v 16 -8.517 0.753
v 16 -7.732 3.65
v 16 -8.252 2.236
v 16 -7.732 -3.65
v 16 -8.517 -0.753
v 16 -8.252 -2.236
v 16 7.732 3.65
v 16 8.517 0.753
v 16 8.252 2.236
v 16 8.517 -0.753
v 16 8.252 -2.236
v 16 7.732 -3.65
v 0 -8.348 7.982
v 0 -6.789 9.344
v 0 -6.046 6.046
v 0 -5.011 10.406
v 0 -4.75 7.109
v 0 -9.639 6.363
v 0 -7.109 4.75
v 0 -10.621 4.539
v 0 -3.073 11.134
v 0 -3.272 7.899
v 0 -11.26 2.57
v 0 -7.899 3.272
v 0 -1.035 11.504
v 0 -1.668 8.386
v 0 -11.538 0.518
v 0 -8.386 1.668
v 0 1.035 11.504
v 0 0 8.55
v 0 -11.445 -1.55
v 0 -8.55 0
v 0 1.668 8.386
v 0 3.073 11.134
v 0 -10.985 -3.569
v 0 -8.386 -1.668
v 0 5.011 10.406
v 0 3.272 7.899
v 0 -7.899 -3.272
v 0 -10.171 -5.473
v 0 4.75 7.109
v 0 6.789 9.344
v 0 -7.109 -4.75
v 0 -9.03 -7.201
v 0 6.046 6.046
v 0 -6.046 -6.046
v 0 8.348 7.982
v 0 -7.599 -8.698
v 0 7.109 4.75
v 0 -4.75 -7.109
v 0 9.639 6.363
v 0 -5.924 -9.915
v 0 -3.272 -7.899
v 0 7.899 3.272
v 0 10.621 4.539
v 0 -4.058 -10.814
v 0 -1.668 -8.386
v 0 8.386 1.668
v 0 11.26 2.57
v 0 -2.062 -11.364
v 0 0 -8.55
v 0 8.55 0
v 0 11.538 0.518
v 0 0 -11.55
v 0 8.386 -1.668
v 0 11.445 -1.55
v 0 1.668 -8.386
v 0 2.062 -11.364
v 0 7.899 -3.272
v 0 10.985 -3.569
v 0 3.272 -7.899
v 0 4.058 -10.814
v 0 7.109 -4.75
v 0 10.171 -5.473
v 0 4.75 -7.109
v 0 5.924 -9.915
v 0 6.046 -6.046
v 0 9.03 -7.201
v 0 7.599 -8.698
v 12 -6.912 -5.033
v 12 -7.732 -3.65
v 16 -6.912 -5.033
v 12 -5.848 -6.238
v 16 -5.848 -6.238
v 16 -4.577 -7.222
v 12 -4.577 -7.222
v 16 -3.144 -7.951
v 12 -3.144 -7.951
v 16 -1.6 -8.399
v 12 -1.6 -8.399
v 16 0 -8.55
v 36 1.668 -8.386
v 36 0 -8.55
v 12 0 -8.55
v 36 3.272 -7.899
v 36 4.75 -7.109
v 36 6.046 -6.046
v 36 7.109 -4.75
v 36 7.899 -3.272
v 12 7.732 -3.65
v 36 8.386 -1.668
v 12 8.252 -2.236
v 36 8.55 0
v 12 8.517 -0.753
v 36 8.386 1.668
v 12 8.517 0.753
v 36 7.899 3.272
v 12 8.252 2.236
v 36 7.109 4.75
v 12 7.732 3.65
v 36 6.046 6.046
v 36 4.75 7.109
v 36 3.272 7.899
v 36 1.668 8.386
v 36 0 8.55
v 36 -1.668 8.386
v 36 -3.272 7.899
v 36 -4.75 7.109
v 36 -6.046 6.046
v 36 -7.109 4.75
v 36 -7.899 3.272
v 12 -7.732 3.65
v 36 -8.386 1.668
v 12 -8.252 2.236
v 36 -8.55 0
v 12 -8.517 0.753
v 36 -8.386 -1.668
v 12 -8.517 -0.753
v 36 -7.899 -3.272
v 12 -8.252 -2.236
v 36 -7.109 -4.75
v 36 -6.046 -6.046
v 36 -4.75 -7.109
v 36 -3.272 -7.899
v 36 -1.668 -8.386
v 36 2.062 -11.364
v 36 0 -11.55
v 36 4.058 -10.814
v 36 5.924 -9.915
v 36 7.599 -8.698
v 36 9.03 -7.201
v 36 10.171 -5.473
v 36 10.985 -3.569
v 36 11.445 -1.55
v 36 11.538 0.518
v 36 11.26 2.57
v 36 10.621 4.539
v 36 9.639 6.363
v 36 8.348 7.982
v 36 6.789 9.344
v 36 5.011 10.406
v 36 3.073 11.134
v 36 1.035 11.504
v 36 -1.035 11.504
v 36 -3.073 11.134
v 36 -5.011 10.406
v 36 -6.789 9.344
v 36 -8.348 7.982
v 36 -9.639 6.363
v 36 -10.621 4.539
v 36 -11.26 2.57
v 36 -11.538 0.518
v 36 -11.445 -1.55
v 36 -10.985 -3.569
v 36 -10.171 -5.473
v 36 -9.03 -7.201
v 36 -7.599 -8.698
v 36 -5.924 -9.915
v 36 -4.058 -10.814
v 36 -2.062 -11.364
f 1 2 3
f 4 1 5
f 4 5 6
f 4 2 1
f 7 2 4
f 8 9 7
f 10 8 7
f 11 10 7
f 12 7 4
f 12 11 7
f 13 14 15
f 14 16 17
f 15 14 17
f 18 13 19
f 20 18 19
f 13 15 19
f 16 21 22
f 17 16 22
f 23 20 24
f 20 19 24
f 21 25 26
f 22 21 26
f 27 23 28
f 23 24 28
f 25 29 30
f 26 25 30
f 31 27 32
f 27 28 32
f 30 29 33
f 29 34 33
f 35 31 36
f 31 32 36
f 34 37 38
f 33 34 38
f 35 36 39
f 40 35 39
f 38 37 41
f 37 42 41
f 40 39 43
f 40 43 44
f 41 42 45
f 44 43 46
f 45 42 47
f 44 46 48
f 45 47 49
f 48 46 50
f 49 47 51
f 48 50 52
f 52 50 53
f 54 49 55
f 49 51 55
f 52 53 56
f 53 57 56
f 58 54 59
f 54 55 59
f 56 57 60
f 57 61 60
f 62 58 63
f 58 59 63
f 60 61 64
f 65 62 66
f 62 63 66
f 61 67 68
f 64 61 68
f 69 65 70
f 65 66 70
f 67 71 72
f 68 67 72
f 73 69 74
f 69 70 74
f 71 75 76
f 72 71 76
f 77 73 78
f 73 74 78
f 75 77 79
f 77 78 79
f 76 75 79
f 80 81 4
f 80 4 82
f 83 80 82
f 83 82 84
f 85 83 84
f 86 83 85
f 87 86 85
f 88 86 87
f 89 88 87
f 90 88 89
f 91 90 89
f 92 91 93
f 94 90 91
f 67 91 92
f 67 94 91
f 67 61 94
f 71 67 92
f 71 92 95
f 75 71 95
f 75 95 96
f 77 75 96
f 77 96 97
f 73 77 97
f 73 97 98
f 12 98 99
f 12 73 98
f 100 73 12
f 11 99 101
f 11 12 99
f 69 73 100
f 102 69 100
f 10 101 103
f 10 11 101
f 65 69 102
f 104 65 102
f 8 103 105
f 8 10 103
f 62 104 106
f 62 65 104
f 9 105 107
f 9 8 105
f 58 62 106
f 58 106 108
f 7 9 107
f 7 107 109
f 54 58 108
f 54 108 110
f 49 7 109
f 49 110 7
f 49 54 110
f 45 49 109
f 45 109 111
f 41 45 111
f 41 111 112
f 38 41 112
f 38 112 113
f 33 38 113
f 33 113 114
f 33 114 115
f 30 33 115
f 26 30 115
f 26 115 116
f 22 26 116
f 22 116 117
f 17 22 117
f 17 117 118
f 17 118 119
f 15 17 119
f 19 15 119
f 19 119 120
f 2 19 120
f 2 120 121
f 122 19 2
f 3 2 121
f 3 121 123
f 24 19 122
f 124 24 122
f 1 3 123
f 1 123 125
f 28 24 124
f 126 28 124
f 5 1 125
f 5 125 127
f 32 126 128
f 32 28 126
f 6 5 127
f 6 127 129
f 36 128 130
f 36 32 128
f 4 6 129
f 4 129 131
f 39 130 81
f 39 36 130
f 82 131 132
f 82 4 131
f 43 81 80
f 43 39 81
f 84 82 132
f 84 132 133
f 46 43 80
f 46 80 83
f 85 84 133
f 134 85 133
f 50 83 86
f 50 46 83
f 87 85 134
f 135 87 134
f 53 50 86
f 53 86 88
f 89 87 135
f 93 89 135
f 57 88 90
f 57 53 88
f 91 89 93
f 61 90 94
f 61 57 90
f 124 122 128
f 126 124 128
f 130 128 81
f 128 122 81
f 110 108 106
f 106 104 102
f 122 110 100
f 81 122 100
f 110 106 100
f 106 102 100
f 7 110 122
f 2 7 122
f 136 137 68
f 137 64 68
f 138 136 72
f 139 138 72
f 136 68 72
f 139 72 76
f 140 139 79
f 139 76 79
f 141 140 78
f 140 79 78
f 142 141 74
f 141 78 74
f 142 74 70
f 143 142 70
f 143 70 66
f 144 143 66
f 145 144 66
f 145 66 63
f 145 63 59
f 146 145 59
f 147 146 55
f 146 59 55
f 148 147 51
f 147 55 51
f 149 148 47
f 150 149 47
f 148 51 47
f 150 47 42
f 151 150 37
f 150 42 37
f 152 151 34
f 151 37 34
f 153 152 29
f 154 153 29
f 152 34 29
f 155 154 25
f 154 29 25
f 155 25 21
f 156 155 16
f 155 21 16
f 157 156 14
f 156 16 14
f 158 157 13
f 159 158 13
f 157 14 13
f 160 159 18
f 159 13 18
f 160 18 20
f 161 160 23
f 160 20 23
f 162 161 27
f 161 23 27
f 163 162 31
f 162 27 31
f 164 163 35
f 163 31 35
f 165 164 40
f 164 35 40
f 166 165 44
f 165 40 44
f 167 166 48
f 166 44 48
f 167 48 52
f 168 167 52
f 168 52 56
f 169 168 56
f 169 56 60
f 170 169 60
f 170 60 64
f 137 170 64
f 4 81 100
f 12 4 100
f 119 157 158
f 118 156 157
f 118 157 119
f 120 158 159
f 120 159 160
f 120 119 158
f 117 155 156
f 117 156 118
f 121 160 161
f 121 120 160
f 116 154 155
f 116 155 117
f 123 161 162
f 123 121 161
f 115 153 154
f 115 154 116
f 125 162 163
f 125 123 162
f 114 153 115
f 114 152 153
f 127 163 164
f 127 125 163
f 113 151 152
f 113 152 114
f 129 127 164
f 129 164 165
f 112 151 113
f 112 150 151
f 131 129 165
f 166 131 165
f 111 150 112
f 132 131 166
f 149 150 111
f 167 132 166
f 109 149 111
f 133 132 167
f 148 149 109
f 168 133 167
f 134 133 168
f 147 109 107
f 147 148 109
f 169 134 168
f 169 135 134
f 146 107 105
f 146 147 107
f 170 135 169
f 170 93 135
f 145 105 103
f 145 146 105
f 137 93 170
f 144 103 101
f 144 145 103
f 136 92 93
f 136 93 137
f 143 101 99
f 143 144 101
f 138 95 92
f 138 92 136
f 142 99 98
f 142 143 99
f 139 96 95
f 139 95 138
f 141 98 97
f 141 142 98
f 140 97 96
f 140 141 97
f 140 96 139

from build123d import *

# Parameters (mm, degrees)
SKETCH1_R           = 11.55
SKETCH1_R_2         = 8.55
BOSS_EXTRUDE1_DEPTH = 12
BOSS_EXTRUDE2_DEPTH = 4
SKETCH3_R           = 11.55
SKETCH3_R_2         = 8.55
BOSS_EXTRUDE3_DEPTH = 4
SKETCH4_R           = 11.55
SKETCH4_R_2         = 8.55
BOSS_EXTRUDE4_DEPTH = 20


with BuildPart() as part:
    # Sketch1 → Boss-Extrude1 (new body)
    with BuildSketch(Plane(origin=(0, 0, 0), x_dir=(0, 0, -1), z_dir=(1, 0, 0))):
        Circle(SKETCH1_R)
        Circle(SKETCH1_R_2, mode=Mode.SUBTRACT)
    extrude(amount=BOSS_EXTRUDE1_DEPTH)



with BuildPart() as body_2:
    # Sketch2 → Boss-Extrude2 (new body)
    with BuildSketch(Plane(origin=(12, 0, 0), x_dir=(0, 0, -1), z_dir=(1, 0, 0))):
        with BuildLine():
            Line((-3.65, 7.731752712), (-3.65, -7.731752712))
            ThreePointArc((-3.65, -7.731752712), (0, -8.55), (3.65, -7.731752712))
            Line((3.65, -7.731752712), (3.65, 7.731752712))
            ThreePointArc((3.65, 7.731752712), (0, 8.55), (-3.65, 7.731752712))
        make_face()
    extrude(amount=BOSS_EXTRUDE2_DEPTH)


with BuildPart() as part_1:
    add(part.part)

    add(body_2.part)  # Boss-Extrude3 merges body 2
    # Sketch3 → Boss-Extrude3 (add)
    with BuildSketch(Plane(origin=(12, 0, 0), x_dir=(0, 0, -1), z_dir=(1, 0, 0))):
        Circle(SKETCH3_R)
        with Locations(Location((0, 0, 0), (0, 0, 244.72897634))):
            Circle(SKETCH3_R_2, mode=Mode.SUBTRACT)
    extrude(amount=BOSS_EXTRUDE3_DEPTH)

    # Sketch4 → Boss-Extrude4 (add)
    with BuildSketch(Plane(origin=(16, 0, 0), x_dir=(0, 0, -1), z_dir=(1, 0, 0))):
        Circle(SKETCH4_R)
        Circle(SKETCH4_R_2, mode=Mode.SUBTRACT)
    extrude(amount=BOSS_EXTRUDE4_DEPTH)


solid = part_1.part
